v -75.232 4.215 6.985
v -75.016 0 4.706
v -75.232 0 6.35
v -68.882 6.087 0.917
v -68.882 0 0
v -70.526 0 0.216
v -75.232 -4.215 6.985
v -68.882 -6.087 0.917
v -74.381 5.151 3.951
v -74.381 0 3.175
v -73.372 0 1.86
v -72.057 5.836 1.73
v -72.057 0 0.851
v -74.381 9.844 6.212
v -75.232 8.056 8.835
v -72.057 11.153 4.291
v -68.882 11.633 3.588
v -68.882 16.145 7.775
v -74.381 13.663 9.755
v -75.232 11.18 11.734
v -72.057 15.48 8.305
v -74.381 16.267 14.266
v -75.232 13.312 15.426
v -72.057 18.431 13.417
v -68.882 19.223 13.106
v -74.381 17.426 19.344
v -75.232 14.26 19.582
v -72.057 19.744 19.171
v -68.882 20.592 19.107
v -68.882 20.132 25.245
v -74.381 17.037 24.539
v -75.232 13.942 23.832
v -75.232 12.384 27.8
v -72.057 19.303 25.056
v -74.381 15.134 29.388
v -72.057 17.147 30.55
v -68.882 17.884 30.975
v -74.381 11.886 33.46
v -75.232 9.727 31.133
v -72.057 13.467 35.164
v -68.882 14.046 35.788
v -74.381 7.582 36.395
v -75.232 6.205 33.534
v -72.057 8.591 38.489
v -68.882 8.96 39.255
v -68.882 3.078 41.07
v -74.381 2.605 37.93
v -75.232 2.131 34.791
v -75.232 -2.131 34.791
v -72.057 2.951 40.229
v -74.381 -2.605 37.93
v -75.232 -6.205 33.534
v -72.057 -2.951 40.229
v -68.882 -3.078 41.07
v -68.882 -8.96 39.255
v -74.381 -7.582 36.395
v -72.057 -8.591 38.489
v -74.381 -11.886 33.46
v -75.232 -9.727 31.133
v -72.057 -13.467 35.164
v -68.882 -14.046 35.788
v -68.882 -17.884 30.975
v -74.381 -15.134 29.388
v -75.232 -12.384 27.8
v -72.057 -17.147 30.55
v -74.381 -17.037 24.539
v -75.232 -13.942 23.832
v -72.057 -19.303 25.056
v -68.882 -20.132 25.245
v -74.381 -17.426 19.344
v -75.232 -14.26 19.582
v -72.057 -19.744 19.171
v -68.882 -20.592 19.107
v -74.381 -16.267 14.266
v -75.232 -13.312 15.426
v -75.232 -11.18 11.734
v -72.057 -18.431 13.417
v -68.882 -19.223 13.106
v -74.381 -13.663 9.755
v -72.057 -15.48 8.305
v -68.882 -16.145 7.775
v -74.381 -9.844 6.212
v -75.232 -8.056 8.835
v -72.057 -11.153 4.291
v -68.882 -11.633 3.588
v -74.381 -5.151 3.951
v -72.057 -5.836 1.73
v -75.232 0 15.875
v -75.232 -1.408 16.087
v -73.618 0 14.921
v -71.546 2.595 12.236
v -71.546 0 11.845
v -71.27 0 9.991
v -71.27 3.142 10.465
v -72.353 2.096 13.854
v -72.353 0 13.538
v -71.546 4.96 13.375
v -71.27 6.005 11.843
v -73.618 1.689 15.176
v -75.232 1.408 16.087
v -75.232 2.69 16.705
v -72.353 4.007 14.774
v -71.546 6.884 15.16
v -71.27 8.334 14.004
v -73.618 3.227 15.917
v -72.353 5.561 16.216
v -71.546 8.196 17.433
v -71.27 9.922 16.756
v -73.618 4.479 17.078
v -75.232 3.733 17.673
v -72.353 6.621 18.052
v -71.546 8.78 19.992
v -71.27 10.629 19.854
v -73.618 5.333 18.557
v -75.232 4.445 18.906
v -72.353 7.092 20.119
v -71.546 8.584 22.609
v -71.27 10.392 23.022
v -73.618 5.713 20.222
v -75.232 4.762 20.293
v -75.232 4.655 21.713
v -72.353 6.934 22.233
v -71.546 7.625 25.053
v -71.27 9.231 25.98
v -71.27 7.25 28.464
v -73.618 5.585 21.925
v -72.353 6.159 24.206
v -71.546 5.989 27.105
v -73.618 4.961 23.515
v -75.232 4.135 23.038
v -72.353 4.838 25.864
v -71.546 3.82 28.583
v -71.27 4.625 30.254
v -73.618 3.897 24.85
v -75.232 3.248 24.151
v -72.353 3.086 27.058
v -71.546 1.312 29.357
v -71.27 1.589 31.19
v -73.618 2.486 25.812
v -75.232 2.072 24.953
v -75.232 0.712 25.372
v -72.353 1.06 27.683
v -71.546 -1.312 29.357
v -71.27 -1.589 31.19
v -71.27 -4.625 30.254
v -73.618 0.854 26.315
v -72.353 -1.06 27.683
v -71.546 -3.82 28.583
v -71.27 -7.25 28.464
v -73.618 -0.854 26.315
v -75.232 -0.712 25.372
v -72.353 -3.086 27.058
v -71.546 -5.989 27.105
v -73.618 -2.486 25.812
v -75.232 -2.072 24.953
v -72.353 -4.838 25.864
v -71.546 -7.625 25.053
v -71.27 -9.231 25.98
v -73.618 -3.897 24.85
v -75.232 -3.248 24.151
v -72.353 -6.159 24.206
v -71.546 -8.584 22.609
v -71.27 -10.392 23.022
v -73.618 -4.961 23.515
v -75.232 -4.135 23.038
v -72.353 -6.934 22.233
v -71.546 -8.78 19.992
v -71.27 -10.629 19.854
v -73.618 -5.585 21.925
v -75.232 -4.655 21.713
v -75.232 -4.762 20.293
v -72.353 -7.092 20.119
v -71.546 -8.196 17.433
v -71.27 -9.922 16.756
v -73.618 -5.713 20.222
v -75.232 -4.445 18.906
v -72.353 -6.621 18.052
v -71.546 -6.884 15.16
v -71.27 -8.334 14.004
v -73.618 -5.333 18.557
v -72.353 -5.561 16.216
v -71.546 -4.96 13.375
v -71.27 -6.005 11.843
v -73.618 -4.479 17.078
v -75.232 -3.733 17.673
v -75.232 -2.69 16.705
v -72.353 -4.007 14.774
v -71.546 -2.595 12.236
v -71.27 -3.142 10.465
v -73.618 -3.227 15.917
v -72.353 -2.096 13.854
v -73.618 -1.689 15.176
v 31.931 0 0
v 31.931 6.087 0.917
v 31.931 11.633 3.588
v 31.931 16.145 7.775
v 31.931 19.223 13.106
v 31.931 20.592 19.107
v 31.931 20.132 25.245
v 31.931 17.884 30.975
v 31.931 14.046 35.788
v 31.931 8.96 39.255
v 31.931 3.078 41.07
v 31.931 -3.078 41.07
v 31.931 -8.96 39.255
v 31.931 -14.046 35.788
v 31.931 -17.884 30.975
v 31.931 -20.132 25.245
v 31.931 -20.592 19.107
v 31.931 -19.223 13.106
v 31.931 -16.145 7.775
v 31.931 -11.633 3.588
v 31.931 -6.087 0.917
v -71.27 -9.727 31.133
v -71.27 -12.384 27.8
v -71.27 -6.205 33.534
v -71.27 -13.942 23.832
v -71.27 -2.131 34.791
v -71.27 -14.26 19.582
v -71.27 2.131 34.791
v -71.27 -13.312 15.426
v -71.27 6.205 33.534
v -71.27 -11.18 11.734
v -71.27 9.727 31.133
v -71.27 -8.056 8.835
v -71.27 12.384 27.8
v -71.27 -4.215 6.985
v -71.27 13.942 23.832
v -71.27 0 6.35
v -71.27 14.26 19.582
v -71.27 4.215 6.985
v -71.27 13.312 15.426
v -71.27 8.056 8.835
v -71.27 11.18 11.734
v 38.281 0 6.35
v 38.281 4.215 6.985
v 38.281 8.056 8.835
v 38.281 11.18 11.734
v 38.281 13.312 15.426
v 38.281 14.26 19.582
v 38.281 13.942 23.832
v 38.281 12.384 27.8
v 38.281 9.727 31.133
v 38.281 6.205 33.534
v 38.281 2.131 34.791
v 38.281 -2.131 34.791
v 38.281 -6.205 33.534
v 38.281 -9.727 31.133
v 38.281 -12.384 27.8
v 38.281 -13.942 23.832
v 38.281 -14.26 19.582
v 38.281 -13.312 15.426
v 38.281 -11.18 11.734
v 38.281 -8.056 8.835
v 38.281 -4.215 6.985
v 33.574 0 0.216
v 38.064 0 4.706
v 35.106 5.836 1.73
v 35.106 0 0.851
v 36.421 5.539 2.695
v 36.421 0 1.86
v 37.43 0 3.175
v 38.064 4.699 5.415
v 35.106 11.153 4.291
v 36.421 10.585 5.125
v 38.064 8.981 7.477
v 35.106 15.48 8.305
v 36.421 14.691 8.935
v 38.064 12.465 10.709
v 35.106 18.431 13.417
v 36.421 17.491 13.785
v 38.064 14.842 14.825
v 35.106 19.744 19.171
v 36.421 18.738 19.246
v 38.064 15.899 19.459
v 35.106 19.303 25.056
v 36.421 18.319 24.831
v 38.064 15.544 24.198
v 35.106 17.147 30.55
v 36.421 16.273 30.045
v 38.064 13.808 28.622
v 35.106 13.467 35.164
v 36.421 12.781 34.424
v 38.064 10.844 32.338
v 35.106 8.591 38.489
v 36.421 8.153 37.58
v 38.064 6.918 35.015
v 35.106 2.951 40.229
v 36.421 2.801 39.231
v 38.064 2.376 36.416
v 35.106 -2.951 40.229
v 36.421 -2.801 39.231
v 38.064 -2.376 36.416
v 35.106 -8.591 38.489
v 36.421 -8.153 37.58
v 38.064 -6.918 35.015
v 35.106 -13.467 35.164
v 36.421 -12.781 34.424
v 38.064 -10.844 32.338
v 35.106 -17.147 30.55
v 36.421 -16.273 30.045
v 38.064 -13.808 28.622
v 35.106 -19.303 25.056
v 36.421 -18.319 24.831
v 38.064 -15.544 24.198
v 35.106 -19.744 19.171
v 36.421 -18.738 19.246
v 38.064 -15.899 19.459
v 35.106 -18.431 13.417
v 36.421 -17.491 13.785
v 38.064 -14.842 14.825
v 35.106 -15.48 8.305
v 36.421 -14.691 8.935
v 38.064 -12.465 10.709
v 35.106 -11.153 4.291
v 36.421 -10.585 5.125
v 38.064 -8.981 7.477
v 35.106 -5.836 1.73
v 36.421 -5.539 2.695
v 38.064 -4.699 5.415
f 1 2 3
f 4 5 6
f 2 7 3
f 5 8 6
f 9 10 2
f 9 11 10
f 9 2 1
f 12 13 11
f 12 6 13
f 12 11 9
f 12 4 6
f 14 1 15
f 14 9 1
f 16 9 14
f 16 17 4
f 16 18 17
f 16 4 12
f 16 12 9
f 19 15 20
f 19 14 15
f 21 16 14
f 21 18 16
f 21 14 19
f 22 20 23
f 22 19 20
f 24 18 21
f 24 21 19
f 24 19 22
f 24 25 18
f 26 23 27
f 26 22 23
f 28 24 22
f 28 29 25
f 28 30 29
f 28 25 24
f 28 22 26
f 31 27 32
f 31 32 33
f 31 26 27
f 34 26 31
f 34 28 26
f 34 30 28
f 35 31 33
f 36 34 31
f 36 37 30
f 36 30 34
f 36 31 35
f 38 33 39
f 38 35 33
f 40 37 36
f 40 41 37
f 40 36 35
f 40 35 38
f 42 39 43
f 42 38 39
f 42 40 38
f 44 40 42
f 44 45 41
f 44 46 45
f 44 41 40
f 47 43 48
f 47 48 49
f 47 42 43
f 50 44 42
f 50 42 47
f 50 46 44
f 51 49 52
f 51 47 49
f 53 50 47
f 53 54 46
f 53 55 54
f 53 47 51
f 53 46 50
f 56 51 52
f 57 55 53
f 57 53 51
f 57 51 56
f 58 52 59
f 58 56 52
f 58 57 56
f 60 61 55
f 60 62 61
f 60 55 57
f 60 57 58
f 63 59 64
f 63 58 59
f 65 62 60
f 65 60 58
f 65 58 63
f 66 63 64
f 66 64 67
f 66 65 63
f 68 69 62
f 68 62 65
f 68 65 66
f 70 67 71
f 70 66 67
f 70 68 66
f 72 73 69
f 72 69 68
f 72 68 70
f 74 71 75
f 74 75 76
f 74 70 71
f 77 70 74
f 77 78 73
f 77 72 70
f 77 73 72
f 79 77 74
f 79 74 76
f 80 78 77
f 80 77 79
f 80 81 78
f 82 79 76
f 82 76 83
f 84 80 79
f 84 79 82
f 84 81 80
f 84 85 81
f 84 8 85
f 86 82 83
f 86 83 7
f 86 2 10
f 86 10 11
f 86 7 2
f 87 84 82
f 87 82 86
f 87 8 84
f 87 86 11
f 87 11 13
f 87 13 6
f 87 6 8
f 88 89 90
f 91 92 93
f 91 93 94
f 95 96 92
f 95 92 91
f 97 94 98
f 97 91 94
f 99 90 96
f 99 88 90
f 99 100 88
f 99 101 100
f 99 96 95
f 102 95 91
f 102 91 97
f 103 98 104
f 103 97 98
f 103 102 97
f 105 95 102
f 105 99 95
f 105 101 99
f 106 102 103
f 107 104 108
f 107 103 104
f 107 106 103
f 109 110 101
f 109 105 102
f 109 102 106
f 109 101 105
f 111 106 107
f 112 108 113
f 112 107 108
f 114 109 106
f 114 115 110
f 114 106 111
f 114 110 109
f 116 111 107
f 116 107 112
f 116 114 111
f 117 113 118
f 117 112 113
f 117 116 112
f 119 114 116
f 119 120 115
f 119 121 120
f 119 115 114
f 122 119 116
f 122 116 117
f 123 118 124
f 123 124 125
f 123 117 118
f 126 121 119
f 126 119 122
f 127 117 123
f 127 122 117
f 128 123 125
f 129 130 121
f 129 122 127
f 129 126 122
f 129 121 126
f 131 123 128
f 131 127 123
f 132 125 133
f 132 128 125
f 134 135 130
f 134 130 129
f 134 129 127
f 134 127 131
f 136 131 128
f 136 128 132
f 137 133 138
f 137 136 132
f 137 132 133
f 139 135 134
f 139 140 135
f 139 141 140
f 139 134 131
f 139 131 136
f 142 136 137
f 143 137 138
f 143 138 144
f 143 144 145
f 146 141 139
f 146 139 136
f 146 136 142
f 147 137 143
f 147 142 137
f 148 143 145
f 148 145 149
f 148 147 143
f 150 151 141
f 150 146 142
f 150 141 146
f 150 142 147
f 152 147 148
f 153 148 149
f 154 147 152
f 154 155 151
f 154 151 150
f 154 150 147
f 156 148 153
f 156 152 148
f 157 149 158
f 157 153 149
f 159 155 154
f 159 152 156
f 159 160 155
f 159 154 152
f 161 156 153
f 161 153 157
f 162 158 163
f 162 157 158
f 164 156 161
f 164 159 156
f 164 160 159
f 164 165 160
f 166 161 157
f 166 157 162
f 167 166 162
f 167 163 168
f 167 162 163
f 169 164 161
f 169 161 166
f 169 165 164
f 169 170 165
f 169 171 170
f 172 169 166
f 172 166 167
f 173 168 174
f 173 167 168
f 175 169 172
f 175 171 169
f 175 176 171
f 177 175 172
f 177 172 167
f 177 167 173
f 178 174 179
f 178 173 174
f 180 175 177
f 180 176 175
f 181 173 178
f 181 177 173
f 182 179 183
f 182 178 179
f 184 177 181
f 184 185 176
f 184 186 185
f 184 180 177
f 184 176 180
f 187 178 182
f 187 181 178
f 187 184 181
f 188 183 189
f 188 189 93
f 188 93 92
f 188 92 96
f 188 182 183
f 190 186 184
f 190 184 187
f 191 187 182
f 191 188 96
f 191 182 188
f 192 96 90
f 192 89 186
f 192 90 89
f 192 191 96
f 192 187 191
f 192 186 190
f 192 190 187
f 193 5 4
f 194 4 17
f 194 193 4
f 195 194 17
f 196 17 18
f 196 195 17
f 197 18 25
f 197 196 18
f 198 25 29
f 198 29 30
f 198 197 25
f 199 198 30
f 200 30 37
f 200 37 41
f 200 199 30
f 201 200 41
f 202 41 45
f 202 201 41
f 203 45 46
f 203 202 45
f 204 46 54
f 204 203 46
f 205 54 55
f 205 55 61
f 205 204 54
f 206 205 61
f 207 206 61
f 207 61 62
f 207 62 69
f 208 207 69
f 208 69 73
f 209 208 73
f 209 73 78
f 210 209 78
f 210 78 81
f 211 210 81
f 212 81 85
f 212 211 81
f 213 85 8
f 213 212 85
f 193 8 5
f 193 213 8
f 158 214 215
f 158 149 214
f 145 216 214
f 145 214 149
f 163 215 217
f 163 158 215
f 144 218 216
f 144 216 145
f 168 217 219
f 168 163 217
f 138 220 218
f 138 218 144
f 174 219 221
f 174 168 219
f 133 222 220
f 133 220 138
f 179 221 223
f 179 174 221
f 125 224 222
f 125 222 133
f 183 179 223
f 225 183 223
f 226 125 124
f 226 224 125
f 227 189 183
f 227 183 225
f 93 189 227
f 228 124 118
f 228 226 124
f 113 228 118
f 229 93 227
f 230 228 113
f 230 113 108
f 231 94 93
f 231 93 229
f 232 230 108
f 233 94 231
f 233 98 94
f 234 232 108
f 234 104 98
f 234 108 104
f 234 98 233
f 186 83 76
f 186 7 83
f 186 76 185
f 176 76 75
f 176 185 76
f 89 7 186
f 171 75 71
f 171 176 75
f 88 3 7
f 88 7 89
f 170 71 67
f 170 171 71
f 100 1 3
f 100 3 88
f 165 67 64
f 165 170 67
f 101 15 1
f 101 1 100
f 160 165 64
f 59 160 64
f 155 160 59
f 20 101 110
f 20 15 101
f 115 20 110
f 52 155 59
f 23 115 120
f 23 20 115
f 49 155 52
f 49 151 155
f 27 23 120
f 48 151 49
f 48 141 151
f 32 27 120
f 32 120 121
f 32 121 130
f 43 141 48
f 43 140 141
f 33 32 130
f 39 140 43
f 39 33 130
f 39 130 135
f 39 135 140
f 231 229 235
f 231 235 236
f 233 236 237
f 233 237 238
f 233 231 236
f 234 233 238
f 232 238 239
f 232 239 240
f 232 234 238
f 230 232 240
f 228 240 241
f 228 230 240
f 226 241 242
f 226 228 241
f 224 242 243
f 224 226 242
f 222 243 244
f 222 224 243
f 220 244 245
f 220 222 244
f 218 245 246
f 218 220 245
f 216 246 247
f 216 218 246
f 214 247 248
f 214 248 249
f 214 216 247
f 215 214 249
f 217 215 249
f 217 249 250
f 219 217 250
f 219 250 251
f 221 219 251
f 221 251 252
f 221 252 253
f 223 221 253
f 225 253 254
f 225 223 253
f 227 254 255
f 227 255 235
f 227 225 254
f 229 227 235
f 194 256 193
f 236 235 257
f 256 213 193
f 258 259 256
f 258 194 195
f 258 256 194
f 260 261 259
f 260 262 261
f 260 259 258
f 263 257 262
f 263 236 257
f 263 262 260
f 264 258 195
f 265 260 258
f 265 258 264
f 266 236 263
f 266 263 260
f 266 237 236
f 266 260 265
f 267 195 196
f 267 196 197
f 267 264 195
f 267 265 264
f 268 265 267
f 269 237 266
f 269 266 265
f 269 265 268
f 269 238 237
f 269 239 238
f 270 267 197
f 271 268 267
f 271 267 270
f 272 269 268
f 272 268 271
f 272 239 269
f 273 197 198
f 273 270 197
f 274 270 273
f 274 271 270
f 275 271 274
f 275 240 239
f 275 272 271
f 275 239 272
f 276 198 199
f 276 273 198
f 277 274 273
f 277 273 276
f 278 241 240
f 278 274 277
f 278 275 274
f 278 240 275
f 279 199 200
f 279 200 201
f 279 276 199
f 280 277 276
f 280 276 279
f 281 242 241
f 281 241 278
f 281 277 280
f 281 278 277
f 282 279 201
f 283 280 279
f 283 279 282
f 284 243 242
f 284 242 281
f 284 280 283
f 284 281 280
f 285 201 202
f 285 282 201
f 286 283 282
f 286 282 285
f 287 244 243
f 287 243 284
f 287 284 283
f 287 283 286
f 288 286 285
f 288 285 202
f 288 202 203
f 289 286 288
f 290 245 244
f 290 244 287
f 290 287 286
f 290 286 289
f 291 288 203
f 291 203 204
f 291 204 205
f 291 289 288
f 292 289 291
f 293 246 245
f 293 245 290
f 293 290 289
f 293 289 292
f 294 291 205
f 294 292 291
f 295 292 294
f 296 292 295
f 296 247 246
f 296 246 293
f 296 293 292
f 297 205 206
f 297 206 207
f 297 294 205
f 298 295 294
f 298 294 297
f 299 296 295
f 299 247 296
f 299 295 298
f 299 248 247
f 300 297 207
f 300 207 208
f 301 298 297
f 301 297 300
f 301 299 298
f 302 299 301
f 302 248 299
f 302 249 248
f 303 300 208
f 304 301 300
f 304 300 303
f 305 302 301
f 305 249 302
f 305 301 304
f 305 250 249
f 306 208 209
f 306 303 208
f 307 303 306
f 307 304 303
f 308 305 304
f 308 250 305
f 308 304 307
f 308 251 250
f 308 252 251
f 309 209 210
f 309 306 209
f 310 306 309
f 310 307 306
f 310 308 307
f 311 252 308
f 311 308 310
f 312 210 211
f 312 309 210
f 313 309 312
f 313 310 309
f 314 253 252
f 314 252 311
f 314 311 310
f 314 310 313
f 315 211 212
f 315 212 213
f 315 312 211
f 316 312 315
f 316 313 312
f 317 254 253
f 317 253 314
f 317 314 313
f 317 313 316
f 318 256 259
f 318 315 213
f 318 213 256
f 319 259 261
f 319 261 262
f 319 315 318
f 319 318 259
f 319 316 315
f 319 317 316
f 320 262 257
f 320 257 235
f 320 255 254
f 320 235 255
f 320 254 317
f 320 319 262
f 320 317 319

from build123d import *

# Parameters (mm, degrees)
F3_R = 6.35


# Not quite as in the source:
# - a fillet or chamfer that OpenCascade refuses, or shapes differently, is made with other operations: its cross-section is extruded or revolved along the edge and cut away or added


with BuildPart() as f1:
    # F0 (on Front) → F1 (revolve)
    with BuildSketch(Plane.XZ):
        Polygon((-75.2320736647, 15.875), (-75.2320736647, 0), (38.2805263353, 0), (38.2805263353, 6.35), (-71.0156736647, 6.35), (-71.2696736647, 6.35), (-71.2696736647, 15.875), align=None)
    revolve(axis=Axis((-17.1681363136, 0, 20.6502), (1, 0, 0)))

    # F2: fillet of radius 6.35 on 2 edges, made by hand

    # F2_s1 → F2_t2 (revolve, cut)
    with BuildSketch(Plane.XZ):
        with BuildLine():
            ThreePointArc((31.9305263353, 0), (36.4206543959, 1.8598719395), (38.2805263353, 6.35))
            Line((38.2805263353, 6.35), (38.2805263353, 0))
            Line((38.2805263353, 0), (31.9305263353, 0))
        make_face()
    revolve(axis=Axis((38.2805263353, 0, 20.6502), (1, 0, 0)), mode=Mode.SUBTRACT)

    # F2_s3 → F2_t4 (revolve, cut)
    with BuildSketch(Plane.XZ):
        with BuildLine():
            ThreePointArc((-71.2696736647, 9.9909651395), (-72.3526175609, 13.5378821106), (-75.2320736647, 15.875))
            Line((-75.2320736647, 15.875), (-71.2696736647, 15.875))
            Line((-71.2696736647, 15.875), (-71.2696736647, 9.9909651395))
        make_face()
    revolve(axis=Axis((-71.2696736647, 0, 20.6502), (1, 0, 0)), mode=Mode.SUBTRACT)

    # F3
    f3_edges = [f1.edges().sort_by_distance(p)[0] for p in [
        (-75.232074, 0, 41.3004),
    ]]
    fillet(f3_edges, radius=F3_R)


solid = f1.part
